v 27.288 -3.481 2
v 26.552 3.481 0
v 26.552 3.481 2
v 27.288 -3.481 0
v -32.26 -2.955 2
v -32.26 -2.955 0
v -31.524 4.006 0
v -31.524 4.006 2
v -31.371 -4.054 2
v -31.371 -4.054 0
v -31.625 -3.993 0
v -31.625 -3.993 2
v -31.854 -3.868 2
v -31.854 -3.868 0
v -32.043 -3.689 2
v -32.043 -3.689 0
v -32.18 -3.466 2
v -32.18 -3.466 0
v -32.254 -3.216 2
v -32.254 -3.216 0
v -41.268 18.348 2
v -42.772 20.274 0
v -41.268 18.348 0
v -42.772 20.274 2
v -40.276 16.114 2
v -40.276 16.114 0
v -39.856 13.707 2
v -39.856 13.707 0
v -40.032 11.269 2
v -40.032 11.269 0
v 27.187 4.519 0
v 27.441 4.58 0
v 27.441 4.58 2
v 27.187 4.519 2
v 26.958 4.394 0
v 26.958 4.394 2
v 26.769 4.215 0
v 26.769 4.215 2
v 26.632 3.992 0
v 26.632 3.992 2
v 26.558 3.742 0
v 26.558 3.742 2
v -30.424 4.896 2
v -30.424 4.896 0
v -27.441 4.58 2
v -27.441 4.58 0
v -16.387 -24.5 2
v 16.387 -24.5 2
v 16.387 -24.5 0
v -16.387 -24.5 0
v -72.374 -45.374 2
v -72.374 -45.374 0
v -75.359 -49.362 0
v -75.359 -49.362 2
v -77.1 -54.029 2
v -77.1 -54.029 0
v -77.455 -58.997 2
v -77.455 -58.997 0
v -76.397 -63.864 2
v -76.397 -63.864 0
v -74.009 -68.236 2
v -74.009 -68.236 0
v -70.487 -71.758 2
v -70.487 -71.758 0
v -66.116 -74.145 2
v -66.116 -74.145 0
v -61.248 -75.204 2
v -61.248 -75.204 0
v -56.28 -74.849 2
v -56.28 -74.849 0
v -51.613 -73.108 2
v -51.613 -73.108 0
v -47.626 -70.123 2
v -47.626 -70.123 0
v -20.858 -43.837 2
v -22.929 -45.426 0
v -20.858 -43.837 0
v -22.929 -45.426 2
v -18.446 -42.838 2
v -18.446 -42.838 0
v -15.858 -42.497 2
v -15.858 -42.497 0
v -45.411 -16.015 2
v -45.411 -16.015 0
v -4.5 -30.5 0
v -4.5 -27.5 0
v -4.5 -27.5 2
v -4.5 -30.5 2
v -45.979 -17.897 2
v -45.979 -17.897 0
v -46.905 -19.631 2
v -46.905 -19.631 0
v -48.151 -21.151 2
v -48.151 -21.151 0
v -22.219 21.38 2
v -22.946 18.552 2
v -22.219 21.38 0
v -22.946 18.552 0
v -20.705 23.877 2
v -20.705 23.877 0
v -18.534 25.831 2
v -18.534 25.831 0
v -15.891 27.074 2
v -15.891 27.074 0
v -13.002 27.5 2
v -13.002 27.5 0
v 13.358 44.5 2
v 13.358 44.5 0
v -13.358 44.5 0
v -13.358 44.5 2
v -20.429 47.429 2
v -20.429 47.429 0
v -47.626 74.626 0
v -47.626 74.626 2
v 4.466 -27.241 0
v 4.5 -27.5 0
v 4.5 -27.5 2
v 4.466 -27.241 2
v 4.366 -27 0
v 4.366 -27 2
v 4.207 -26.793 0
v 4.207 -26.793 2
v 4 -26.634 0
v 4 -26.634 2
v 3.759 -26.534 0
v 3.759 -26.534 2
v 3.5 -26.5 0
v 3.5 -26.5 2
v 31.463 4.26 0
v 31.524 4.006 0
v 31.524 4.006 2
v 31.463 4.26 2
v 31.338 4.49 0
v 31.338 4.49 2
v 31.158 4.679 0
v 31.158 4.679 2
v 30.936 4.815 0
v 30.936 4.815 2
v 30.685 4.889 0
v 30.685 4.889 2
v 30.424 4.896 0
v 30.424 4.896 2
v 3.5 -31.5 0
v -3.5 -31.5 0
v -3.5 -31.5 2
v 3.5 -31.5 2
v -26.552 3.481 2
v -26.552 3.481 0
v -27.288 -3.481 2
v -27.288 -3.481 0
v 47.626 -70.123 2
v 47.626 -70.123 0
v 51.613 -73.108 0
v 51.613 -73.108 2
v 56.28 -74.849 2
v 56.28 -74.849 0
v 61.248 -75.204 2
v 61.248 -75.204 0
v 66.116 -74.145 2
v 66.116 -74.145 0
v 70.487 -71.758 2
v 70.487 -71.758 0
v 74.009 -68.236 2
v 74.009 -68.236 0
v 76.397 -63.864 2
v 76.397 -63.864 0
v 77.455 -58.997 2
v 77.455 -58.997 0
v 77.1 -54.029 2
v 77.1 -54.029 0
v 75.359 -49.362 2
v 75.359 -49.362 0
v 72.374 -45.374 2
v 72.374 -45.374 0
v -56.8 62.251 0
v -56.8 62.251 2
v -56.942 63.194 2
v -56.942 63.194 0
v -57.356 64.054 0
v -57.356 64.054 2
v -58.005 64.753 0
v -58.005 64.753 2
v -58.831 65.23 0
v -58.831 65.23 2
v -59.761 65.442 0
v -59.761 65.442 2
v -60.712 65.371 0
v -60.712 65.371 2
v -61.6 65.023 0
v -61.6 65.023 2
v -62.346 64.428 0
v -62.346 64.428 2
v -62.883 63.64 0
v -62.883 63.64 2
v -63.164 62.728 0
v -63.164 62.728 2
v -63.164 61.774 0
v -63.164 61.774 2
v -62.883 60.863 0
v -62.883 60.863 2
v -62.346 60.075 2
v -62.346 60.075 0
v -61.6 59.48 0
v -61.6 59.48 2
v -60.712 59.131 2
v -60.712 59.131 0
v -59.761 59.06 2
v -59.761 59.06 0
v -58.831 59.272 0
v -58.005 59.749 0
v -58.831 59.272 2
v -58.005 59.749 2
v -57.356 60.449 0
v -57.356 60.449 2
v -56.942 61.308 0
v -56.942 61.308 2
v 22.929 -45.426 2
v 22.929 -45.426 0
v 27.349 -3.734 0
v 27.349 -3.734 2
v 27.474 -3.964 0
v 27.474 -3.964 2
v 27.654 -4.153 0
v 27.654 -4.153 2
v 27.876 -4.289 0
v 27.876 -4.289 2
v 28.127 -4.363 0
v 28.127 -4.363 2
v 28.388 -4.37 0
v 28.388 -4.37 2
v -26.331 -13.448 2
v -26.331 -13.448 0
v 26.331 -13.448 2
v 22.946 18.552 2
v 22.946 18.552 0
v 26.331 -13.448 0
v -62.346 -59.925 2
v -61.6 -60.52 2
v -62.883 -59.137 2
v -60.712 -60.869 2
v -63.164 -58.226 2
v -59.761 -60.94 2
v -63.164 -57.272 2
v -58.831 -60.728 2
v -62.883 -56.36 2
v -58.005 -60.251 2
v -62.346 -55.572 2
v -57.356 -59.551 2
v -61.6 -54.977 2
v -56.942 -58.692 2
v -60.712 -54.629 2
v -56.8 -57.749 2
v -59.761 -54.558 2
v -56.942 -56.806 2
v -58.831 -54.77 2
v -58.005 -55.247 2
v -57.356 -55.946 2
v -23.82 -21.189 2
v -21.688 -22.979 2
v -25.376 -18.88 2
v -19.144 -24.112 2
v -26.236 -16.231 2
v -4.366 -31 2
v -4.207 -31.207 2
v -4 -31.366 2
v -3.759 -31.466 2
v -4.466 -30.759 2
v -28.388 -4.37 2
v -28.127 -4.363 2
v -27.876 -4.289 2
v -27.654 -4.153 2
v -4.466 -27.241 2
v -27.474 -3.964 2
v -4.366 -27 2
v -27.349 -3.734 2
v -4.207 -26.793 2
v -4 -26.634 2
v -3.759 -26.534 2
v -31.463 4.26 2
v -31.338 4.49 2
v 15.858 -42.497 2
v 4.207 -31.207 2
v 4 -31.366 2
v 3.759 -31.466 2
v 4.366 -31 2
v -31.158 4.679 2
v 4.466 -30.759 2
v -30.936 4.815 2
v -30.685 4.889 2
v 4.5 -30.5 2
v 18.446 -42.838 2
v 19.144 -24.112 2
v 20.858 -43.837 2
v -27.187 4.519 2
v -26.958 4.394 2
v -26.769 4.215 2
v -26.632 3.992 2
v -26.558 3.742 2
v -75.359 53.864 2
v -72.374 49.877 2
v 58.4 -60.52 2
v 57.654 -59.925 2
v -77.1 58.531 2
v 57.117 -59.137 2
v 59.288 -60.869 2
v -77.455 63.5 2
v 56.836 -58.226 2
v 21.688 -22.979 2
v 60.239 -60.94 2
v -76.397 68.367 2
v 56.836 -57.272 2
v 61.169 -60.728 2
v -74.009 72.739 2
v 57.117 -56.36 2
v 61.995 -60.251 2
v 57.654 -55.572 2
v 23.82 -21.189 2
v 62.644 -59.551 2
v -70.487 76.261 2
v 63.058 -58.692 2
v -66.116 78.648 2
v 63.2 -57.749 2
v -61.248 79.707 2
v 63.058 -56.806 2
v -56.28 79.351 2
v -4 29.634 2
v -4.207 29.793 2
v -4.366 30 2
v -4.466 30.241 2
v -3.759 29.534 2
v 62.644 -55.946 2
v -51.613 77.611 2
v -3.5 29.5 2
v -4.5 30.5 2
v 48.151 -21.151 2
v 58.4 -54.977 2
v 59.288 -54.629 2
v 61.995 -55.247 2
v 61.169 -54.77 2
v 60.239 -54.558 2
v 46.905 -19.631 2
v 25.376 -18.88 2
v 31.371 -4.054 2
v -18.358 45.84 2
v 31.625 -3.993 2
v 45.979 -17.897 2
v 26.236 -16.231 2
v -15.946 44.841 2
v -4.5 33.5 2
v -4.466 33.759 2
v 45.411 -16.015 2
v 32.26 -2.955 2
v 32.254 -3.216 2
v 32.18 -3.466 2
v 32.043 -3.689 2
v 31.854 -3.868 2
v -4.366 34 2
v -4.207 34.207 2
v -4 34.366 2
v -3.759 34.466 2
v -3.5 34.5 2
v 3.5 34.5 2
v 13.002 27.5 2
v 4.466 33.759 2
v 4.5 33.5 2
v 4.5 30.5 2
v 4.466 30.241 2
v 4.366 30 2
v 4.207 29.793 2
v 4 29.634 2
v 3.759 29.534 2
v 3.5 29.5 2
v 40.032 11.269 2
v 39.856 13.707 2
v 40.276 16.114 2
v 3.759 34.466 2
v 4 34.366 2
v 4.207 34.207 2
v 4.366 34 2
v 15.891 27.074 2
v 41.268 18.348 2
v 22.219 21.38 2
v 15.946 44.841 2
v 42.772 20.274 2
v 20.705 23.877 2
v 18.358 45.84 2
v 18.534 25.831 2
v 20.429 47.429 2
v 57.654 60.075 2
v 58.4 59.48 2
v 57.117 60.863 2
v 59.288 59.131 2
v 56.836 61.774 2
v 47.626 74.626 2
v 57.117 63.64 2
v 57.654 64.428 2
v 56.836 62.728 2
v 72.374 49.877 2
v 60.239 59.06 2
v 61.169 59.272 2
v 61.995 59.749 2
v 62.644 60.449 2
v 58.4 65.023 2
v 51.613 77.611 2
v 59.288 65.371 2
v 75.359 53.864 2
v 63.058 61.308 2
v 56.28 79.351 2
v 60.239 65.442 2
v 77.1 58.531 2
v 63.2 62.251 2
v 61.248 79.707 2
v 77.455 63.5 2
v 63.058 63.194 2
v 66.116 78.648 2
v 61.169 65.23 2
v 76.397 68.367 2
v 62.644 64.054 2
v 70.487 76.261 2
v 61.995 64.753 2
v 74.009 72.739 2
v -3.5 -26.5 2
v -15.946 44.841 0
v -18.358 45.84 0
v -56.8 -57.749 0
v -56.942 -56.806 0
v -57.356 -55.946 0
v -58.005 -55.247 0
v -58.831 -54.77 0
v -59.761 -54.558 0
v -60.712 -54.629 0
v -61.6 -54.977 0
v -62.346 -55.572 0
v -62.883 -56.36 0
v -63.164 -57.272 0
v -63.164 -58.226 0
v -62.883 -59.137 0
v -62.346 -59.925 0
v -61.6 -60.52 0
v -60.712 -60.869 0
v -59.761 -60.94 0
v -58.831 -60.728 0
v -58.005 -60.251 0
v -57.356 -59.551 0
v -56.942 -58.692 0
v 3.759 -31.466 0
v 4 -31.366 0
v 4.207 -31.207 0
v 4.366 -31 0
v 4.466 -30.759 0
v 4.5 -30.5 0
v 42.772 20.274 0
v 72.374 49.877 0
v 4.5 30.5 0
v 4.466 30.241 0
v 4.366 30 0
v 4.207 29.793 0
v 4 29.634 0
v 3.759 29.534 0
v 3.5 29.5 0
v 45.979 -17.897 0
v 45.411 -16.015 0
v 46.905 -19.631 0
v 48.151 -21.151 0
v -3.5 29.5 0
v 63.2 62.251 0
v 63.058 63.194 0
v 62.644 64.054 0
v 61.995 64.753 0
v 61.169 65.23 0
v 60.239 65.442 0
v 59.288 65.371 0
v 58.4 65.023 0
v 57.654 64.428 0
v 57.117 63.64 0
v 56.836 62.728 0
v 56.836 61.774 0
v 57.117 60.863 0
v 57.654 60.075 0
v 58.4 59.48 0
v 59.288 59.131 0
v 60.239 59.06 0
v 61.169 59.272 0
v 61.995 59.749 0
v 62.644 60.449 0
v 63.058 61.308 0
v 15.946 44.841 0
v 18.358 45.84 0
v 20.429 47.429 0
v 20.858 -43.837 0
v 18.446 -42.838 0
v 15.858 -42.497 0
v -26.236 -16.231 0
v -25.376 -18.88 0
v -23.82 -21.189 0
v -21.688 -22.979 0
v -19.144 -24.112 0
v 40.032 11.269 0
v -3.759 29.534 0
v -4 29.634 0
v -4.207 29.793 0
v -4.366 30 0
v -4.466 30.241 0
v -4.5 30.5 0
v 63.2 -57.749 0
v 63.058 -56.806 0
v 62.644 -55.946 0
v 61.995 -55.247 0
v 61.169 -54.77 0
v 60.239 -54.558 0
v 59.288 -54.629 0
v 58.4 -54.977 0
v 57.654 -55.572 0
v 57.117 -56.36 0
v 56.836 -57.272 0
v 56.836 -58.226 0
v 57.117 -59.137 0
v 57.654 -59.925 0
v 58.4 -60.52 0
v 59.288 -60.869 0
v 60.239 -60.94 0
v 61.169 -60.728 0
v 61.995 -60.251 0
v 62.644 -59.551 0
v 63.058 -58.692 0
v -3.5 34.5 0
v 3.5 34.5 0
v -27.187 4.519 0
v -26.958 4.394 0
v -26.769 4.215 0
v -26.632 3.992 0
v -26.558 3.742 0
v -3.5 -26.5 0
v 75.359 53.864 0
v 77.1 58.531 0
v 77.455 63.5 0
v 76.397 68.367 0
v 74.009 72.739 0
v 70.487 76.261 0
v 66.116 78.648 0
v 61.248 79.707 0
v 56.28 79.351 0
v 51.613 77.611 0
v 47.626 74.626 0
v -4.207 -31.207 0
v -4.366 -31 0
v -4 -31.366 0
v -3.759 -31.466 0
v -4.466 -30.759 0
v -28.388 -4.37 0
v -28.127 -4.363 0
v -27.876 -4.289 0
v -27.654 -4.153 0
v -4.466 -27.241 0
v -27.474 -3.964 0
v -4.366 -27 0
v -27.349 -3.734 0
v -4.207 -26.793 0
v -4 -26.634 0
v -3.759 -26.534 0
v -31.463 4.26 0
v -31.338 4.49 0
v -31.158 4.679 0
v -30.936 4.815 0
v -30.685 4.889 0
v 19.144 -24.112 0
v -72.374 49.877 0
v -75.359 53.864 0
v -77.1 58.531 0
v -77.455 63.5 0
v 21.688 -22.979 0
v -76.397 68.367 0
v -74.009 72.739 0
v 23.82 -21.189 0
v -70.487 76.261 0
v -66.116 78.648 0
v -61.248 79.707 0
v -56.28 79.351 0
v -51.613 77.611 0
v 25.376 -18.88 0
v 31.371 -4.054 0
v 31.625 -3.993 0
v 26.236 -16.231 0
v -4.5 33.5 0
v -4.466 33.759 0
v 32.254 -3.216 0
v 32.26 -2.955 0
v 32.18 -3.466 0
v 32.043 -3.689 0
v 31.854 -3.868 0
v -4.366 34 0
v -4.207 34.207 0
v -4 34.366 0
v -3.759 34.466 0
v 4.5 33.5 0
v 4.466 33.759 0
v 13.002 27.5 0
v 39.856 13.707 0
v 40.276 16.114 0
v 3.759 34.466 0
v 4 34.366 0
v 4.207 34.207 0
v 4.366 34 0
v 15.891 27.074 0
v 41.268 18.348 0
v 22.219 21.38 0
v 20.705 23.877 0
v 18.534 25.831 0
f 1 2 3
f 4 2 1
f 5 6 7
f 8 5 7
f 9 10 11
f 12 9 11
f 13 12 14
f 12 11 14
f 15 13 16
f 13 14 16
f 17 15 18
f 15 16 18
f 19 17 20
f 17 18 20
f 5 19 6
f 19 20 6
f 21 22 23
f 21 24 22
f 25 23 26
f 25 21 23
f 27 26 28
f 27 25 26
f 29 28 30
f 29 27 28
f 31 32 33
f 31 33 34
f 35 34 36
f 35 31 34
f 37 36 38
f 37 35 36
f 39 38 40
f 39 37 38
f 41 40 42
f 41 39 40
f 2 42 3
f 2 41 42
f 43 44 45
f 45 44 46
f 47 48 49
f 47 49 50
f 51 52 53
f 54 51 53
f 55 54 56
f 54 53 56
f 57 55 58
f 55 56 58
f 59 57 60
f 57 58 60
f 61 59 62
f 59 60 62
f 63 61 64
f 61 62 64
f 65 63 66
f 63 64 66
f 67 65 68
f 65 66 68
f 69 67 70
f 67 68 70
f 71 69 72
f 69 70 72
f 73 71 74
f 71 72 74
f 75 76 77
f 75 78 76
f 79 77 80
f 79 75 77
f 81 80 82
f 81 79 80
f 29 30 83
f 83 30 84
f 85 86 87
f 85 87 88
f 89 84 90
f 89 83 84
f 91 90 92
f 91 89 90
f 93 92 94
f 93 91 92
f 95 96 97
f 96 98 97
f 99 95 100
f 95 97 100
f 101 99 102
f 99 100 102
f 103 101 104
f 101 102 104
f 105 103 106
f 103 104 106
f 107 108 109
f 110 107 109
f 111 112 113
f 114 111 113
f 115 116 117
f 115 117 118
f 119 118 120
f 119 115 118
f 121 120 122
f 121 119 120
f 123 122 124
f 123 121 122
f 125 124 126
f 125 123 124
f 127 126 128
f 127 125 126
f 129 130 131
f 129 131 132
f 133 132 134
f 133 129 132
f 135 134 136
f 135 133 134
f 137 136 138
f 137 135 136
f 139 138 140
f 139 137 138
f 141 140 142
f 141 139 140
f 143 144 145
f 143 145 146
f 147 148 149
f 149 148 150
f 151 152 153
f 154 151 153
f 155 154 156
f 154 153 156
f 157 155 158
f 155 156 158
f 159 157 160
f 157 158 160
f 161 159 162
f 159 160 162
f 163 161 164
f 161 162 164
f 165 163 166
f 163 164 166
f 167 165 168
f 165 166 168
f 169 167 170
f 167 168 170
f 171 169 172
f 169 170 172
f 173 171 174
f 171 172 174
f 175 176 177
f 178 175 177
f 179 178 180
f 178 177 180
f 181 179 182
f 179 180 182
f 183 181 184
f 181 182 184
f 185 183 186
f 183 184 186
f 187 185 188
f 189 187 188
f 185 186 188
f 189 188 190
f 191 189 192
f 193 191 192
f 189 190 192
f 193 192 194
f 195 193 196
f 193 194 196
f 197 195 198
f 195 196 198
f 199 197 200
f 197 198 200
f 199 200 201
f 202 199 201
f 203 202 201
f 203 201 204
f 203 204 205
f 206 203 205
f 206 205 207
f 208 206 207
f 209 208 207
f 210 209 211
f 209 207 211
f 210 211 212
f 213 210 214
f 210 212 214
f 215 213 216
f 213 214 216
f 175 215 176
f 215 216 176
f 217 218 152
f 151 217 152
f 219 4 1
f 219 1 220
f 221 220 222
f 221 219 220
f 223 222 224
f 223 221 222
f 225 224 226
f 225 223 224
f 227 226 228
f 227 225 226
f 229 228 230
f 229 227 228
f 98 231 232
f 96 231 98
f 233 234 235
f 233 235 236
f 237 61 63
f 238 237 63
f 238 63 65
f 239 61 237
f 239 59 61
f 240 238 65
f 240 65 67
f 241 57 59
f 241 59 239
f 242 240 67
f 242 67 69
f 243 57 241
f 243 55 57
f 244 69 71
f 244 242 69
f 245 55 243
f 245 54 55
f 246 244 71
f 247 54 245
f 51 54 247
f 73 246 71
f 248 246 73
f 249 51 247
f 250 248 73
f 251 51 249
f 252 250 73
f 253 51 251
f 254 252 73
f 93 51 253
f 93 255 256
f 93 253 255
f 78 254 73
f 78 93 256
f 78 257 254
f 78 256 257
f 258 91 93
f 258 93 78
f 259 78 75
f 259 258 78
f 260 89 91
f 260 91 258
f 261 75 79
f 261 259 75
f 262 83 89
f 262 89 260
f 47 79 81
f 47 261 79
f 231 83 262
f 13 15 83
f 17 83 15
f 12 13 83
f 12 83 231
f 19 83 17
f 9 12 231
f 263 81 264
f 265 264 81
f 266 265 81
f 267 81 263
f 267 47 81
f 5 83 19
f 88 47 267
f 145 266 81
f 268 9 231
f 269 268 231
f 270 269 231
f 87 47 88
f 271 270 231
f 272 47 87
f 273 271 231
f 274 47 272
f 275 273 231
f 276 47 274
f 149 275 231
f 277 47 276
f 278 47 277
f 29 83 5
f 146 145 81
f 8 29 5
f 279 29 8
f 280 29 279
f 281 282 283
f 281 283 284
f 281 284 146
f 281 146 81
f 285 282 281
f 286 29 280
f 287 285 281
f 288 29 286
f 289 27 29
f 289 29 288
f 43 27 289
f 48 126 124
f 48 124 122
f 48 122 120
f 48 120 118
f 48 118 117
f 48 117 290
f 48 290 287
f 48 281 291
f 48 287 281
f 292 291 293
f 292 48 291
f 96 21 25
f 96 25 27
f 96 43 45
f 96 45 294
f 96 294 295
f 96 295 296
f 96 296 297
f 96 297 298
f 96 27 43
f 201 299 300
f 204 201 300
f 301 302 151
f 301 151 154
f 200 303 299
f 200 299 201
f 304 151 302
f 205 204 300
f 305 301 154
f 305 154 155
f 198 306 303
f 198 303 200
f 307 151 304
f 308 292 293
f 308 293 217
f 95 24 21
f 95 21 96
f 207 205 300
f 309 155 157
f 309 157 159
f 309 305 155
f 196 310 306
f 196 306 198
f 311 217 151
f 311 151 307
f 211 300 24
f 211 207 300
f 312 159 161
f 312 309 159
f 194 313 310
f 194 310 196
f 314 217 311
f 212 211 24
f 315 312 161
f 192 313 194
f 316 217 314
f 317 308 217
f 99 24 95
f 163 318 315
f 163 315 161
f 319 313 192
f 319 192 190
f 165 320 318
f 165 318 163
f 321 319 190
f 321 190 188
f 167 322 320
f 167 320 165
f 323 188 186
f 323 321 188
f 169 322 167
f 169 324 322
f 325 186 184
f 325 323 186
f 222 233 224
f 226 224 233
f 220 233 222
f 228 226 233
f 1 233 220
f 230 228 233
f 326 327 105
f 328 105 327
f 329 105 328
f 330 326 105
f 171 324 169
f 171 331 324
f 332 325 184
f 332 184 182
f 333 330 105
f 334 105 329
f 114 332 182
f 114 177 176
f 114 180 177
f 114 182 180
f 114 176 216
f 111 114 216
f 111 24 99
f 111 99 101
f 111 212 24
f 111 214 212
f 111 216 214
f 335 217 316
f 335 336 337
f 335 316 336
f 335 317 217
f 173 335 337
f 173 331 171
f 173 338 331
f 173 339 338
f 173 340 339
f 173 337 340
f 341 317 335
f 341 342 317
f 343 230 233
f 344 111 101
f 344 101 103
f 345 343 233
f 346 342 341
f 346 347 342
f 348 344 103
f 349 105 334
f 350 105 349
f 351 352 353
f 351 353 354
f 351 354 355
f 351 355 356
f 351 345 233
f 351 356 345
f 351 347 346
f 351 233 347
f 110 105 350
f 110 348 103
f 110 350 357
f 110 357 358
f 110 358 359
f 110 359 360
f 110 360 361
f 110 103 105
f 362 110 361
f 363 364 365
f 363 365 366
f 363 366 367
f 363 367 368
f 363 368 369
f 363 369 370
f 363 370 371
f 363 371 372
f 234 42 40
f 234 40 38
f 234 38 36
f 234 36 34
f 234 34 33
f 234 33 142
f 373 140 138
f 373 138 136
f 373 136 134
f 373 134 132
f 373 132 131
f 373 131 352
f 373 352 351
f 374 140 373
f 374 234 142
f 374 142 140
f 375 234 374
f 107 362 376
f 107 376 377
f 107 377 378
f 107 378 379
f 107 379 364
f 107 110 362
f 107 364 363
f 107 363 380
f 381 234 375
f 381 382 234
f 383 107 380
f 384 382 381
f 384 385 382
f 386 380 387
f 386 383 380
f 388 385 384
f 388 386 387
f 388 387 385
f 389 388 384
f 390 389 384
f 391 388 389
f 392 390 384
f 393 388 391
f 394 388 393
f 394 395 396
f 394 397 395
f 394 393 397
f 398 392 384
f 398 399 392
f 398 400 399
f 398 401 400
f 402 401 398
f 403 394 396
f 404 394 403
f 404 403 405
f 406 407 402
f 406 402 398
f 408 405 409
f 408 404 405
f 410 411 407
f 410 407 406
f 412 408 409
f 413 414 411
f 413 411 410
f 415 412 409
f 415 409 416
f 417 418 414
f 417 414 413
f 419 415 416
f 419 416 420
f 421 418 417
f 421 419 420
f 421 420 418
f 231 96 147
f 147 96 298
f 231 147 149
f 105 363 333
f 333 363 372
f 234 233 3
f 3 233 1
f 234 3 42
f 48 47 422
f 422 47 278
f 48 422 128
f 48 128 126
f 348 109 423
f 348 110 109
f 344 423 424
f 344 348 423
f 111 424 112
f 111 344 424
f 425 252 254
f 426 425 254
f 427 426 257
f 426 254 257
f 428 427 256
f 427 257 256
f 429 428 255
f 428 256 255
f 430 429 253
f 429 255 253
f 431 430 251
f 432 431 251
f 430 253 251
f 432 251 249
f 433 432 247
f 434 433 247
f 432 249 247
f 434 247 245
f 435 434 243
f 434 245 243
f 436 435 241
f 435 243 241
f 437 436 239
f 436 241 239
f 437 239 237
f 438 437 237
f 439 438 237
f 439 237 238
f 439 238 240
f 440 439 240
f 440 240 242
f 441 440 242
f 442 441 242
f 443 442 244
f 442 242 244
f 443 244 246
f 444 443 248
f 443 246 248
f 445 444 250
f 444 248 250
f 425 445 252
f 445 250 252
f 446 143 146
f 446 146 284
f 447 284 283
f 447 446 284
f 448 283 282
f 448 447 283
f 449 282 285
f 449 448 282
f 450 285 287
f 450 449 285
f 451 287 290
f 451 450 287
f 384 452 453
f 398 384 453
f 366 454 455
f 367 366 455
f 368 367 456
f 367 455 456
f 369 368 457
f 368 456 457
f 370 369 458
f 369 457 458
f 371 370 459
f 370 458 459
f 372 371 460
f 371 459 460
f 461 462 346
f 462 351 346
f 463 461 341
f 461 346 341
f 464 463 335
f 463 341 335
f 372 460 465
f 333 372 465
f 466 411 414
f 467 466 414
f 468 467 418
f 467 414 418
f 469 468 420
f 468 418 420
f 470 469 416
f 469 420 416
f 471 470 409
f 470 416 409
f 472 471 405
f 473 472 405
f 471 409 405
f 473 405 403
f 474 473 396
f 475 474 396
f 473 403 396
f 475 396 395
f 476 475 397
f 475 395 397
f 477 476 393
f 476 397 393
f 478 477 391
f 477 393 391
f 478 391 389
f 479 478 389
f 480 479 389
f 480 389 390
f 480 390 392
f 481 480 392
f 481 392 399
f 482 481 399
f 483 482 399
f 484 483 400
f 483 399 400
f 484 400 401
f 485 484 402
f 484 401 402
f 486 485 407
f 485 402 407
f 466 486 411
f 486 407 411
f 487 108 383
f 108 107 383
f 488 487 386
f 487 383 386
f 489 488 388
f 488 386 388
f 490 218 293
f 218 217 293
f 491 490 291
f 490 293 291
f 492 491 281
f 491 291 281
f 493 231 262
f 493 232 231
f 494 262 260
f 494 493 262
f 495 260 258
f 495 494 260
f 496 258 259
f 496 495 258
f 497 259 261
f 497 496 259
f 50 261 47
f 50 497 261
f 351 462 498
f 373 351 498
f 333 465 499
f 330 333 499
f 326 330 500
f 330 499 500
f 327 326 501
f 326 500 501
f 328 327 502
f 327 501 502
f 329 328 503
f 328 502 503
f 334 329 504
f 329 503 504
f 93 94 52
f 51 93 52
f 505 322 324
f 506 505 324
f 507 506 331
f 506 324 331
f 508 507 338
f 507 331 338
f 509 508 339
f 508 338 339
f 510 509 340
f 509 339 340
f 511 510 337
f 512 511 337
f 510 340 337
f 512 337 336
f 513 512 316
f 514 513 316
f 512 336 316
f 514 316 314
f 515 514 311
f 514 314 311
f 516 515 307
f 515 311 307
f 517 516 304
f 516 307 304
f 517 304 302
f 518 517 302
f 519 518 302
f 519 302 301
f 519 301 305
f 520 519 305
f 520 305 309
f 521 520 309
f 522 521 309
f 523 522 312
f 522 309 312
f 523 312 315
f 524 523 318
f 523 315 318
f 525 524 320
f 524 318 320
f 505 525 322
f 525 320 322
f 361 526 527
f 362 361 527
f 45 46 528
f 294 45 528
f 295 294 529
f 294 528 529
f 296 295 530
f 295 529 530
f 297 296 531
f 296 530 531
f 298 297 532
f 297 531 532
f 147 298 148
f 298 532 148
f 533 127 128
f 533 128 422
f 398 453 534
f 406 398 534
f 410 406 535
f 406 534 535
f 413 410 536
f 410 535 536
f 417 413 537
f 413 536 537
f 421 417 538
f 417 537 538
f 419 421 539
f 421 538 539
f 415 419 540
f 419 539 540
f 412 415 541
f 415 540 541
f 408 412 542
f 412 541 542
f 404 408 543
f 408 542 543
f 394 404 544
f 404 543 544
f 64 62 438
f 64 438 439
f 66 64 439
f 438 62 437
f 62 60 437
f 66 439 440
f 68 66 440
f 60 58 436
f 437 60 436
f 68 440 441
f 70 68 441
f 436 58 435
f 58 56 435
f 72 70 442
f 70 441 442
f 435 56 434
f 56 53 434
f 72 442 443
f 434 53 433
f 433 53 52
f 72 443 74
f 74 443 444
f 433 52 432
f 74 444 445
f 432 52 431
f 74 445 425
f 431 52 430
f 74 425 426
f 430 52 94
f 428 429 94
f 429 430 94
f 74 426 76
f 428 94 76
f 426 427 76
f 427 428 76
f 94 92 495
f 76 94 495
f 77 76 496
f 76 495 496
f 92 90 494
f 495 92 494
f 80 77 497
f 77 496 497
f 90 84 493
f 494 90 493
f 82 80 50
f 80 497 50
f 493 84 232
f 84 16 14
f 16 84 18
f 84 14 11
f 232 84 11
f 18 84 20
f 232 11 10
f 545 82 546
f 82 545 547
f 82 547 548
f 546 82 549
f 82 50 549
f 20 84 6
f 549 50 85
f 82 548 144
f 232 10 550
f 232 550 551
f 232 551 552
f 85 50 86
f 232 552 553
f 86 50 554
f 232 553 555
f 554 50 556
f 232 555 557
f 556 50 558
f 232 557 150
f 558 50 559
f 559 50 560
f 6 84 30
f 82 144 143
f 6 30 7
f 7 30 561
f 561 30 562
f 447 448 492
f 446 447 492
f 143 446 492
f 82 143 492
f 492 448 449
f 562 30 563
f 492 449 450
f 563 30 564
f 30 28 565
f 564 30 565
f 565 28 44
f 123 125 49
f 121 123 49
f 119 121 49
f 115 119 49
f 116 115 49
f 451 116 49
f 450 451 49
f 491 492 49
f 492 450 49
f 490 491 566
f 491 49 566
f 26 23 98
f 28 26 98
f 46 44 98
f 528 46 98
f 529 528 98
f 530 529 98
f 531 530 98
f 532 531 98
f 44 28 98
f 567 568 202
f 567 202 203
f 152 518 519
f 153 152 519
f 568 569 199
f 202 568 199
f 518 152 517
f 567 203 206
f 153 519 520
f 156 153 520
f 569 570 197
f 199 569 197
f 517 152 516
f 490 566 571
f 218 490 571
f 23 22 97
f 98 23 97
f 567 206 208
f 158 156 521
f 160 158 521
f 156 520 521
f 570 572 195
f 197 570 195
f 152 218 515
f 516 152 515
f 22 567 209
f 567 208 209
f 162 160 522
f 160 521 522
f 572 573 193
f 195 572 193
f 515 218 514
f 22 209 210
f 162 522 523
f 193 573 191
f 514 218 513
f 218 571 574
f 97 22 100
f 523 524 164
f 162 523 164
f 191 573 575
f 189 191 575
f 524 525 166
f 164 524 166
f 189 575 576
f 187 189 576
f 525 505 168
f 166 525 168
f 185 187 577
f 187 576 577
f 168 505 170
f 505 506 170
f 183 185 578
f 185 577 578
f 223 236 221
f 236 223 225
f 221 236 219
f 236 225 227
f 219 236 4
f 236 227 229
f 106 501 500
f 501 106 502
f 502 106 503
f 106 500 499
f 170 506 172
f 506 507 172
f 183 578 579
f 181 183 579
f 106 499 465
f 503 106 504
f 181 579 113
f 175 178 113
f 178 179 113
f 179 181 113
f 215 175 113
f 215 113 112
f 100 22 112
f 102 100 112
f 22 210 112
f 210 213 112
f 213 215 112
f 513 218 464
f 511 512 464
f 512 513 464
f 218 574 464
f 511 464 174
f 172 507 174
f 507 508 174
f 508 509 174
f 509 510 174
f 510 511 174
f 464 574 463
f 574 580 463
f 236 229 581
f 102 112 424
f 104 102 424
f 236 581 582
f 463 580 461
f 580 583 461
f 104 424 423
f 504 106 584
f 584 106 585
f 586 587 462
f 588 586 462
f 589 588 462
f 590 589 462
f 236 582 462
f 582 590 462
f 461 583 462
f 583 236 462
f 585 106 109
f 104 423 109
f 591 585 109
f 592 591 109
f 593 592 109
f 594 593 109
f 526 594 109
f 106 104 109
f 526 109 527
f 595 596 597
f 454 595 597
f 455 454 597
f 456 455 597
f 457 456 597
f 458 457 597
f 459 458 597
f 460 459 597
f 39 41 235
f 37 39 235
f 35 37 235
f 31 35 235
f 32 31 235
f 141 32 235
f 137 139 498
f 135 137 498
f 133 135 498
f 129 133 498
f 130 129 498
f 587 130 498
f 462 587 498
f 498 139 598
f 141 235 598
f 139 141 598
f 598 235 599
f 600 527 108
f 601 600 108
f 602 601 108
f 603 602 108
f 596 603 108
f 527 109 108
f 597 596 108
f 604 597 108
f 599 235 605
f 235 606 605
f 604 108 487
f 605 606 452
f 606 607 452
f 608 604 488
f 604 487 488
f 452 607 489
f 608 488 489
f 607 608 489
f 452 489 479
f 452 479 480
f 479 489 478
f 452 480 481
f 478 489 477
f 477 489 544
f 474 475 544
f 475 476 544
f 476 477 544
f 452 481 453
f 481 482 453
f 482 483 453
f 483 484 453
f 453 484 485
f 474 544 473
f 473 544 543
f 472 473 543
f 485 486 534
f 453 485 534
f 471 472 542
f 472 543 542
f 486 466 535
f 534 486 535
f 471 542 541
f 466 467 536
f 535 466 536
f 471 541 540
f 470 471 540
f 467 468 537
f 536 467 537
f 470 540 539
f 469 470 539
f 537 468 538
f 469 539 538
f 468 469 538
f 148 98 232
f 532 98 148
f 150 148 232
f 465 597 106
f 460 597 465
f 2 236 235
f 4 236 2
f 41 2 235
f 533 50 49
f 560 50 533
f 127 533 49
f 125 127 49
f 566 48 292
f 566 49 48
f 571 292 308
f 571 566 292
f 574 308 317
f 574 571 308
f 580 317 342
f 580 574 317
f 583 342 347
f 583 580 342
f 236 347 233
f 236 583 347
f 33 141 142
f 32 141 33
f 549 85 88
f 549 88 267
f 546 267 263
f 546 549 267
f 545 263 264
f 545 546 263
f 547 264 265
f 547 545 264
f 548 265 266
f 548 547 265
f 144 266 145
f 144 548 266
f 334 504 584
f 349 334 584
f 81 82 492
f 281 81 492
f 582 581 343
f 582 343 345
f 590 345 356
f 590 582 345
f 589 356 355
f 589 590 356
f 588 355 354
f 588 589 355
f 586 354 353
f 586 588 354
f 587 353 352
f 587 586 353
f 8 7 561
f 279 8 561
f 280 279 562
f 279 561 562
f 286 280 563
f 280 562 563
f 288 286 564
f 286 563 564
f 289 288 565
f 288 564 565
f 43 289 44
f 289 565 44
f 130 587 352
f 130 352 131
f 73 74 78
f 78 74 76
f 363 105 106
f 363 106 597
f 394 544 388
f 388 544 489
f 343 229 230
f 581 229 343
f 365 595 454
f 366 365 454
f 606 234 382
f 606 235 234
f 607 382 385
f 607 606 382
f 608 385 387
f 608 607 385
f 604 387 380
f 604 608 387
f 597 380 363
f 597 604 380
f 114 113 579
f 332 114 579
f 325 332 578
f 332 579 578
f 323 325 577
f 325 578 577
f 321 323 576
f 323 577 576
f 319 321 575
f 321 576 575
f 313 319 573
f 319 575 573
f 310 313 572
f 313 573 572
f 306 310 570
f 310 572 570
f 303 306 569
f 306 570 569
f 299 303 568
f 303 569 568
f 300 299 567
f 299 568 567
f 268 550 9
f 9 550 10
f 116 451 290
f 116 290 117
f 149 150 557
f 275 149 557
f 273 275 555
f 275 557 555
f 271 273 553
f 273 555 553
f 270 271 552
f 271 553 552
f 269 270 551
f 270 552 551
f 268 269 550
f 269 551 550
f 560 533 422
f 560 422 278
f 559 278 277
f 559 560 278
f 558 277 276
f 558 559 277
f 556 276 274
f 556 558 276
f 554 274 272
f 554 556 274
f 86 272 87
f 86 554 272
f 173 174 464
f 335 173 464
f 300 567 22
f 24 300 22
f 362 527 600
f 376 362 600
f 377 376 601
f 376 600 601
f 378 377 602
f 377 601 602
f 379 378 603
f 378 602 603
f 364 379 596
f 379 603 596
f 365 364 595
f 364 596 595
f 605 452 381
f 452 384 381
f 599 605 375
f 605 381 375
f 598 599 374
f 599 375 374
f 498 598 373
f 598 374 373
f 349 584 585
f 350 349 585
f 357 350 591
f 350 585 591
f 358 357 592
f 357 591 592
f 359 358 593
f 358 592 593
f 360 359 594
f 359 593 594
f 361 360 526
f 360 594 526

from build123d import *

# Parameters (mm, degrees)
AUFSATZ_LINEAR_AUSTRAGEN1_DEPTH      = 2
SKIZZE2_R                            = 3.2
SCHNITT_LINEAR_AUSTRAGEN1_DEPTH      = 2
SCHNITT_LINEAR_AUSTRAGEN3_DEPTH      = 2
VERRUNDUNG1_R                        = 10
VERRUNDUNG2_R                        = 10
SCHNITT_LINEAR_AUSTRAGEN4_DEPTH      = 112.222811939
SCHNITT_LINEAR_AUSTRAGEN4_DEPTH_BACK = 112.222811939


with BuildPart() as part:
    # Skizze1 → Aufsatz-Linear austragen1 (new body)
    with BuildSketch(Plane.XY):
        with BuildLine():
            Line((17.5, 44.5), (-17.5, 44.5))
            Line((-17.5, 44.5), (-47.625631329, 74.625631329))
            ThreePointArc((-47.625631329, 74.625631329), (-72.374368671, 74.625631329), (-72.374368671, 49.876893988))
            Line((-72.374368671, 49.876893988), (-39, 16.502525317))
            Line((-39, 16.502525317), (-46, -19))
            Line((-46, -19), (-72.374368671, -45.374368671))
            ThreePointArc((-72.374368671, -45.374368671), (-72.374368671, -70.123106012), (-47.625631329, -70.123106012))
            Line((-47.625631329, -70.123106012), (-20, -42.497474683))
            Line((-20, -42.497474683), (20, -42.497474683))
            Line((20, -42.497474683), (47.625631329, -70.123106012))
            ThreePointArc((47.625631329, -70.123106012), (72.374368671, -70.123106012), (72.374368671, -45.374368671))
            Line((72.374368671, -45.374368671), (46, -19))
            Line((46, -19), (39, 16.502525317))
            Line((39, 16.502525317), (72.374368671, 49.876893988))
            ThreePointArc((72.374368671, 49.876893988), (72.374368671, 74.625631329), (47.625631329, 74.625631329))
            Line((47.625631329, 74.625631329), (17.5, 44.5))
        make_face()
    extrude(amount=AUFSATZ_LINEAR_AUSTRAGEN1_DEPTH)

    # Skizze2 → Schnitt-Linear austragen1 (cut)
    with BuildSketch(Plane.XY.offset(2)):
        with Locations((-60, -57.748737342)):
            Circle(SKIZZE2_R)
        with Locations((-60, 62.251262658)):
            Circle(SKIZZE2_R)
        with Locations((60, -57.748737342)):
            Circle(SKIZZE2_R)
        with Locations((60, 62.251262658)):
            Circle(SKIZZE2_R)
    extrude(amount=-SCHNITT_LINEAR_AUSTRAGEN1_DEPTH, mode=Mode.SUBTRACT)

    # Skizze4 → Schnitt-Linear austragen3 (cut)
    with BuildSketch(Plane.XY.offset(2)):
        Polygon((-22, 27.5), (22, 27.5), (27.5, -24.5), (-27.5, -24.5), align=None)
    extrude(amount=-SCHNITT_LINEAR_AUSTRAGEN3_DEPTH, mode=Mode.SUBTRACT)

    # Verrundung1
    verrundung1_edges = [part.edges().sort_by_distance(p)[0] for p in [
        (-27.5, -24.5, 1),
        (-22, 27.5, 1),
        (22, 27.5, 1),
        (27.5, -24.5, 1),
    ]]
    fillet(verrundung1_edges, radius=VERRUNDUNG1_R)

    # Verrundung2
    verrundung2_edges = [part.edges().sort_by_distance(p)[0] for p in [
        (-17.5, 44.5, 1),
        (17.5, 44.5, 1),
        (39, 16.502525317, 1),
        (46, -19, 1),
        (20, -42.497474683, 1),
        (-20, -42.497474683, 1),
        (-46, -19, 1),
        (-39, 16.502525317, 1),
    ]]
    fillet(verrundung2_edges, radius=VERRUNDUNG2_R)

    # Skizze5 → Schnitt-Linear austragen4 (cut, two sides: drawn at the far end of the back side and taken through both)
    with BuildSketch(Plane.XY.offset(2).offset(-SCHNITT_LINEAR_AUSTRAGEN4_DEPTH_BACK)):
        with BuildLine():
            Line((-3.5, 34.5), (3.5, 34.5))
            ThreePointArc((3.5, 34.5), (4.207106781, 34.207106781), (4.5, 33.5))
            Line((4.5, 33.5), (4.5, 30.5))
            ThreePointArc((4.5, 30.5), (4.207106781, 29.792893219), (3.5, 29.5))
            Line((3.5, 29.5), (-3.5, 29.5))
            ThreePointArc((-3.5, 29.5), (-4.207106781, 29.792893219), (-4.5, 30.5))
            Line((-4.5, 30.5), (-4.5, 33.5))
            ThreePointArc((-4.5, 33.5), (-4.207106781, 34.207106781), (-3.5, 34.5))
        make_face()
        with BuildLine():
            Line((-30.424300248, 4.895768288), (-27.440941448, 4.580220723))
            ThreePointArc((-27.440941448, 4.580220723), (-26.768564282, 4.214576928), (-26.551671036, 3.480585268))
            Line((-26.551671036, 3.480585268), (-27.287948689, -3.480585268))
            ThreePointArc((-27.287948689, -3.480585268), (-27.653592484, -4.152962433), (-28.387584144, -4.369855679))
            Line((-28.387584144, -4.369855679), (-31.370942945, -4.054308114))
            ThreePointArc((-31.370942945, -4.054308114), (-32.04332011, -3.688664319), (-32.260213356, -2.954672658))
            Line((-32.260213356, -2.954672658), (-31.523935704, 4.006497877))
            ThreePointArc((-31.523935704, 4.006497877), (-31.158291909, 4.678875042), (-30.424300248, 4.895768288))
        make_face()
        with BuildLine():
            Line((26.551671036, 3.480585268), (27.287948689, -3.480585268))
            ThreePointArc((27.287948689, -3.480585268), (27.653592484, -4.152962433), (28.387584144, -4.369855679))
            Line((28.387584144, -4.369855679), (31.370942945, -4.054308114))
            ThreePointArc((31.370942945, -4.054308114), (32.04332011, -3.688664319), (32.260213356, -2.954672658))
            Line((32.260213356, -2.954672658), (31.523935704, 4.006497877))
            ThreePointArc((31.523935704, 4.006497877), (31.158291909, 4.678875042), (30.424300248, 4.895768288))
            Line((30.424300248, 4.895768288), (27.440941448, 4.580220723))
            ThreePointArc((27.440941448, 4.580220723), (26.768564282, 4.214576928), (26.551671036, 3.480585268))
        make_face()
        with BuildLine():
            Line((4.5, -30.5), (4.5, -27.5))
            ThreePointArc((4.5, -27.5), (4.207106781, -26.792893219), (3.5, -26.5))
            Line((3.5, -26.5), (-3.5, -26.5))
            ThreePointArc((-3.5, -26.5), (-4.207106781, -26.792893219), (-4.5, -27.5))
            Line((-4.5, -27.5), (-4.5, -30.5))
            ThreePointArc((-4.5, -30.5), (-4.207106781, -31.207106781), (-3.5, -31.5))
            Line((-3.5, -31.5), (3.5, -31.5))
            ThreePointArc((3.5, -31.5), (4.207106781, -31.207106781), (4.5, -30.5))
        make_face()
    extrude(amount=SCHNITT_LINEAR_AUSTRAGEN4_DEPTH + SCHNITT_LINEAR_AUSTRAGEN4_DEPTH_BACK, mode=Mode.SUBTRACT)


solid = part.part
